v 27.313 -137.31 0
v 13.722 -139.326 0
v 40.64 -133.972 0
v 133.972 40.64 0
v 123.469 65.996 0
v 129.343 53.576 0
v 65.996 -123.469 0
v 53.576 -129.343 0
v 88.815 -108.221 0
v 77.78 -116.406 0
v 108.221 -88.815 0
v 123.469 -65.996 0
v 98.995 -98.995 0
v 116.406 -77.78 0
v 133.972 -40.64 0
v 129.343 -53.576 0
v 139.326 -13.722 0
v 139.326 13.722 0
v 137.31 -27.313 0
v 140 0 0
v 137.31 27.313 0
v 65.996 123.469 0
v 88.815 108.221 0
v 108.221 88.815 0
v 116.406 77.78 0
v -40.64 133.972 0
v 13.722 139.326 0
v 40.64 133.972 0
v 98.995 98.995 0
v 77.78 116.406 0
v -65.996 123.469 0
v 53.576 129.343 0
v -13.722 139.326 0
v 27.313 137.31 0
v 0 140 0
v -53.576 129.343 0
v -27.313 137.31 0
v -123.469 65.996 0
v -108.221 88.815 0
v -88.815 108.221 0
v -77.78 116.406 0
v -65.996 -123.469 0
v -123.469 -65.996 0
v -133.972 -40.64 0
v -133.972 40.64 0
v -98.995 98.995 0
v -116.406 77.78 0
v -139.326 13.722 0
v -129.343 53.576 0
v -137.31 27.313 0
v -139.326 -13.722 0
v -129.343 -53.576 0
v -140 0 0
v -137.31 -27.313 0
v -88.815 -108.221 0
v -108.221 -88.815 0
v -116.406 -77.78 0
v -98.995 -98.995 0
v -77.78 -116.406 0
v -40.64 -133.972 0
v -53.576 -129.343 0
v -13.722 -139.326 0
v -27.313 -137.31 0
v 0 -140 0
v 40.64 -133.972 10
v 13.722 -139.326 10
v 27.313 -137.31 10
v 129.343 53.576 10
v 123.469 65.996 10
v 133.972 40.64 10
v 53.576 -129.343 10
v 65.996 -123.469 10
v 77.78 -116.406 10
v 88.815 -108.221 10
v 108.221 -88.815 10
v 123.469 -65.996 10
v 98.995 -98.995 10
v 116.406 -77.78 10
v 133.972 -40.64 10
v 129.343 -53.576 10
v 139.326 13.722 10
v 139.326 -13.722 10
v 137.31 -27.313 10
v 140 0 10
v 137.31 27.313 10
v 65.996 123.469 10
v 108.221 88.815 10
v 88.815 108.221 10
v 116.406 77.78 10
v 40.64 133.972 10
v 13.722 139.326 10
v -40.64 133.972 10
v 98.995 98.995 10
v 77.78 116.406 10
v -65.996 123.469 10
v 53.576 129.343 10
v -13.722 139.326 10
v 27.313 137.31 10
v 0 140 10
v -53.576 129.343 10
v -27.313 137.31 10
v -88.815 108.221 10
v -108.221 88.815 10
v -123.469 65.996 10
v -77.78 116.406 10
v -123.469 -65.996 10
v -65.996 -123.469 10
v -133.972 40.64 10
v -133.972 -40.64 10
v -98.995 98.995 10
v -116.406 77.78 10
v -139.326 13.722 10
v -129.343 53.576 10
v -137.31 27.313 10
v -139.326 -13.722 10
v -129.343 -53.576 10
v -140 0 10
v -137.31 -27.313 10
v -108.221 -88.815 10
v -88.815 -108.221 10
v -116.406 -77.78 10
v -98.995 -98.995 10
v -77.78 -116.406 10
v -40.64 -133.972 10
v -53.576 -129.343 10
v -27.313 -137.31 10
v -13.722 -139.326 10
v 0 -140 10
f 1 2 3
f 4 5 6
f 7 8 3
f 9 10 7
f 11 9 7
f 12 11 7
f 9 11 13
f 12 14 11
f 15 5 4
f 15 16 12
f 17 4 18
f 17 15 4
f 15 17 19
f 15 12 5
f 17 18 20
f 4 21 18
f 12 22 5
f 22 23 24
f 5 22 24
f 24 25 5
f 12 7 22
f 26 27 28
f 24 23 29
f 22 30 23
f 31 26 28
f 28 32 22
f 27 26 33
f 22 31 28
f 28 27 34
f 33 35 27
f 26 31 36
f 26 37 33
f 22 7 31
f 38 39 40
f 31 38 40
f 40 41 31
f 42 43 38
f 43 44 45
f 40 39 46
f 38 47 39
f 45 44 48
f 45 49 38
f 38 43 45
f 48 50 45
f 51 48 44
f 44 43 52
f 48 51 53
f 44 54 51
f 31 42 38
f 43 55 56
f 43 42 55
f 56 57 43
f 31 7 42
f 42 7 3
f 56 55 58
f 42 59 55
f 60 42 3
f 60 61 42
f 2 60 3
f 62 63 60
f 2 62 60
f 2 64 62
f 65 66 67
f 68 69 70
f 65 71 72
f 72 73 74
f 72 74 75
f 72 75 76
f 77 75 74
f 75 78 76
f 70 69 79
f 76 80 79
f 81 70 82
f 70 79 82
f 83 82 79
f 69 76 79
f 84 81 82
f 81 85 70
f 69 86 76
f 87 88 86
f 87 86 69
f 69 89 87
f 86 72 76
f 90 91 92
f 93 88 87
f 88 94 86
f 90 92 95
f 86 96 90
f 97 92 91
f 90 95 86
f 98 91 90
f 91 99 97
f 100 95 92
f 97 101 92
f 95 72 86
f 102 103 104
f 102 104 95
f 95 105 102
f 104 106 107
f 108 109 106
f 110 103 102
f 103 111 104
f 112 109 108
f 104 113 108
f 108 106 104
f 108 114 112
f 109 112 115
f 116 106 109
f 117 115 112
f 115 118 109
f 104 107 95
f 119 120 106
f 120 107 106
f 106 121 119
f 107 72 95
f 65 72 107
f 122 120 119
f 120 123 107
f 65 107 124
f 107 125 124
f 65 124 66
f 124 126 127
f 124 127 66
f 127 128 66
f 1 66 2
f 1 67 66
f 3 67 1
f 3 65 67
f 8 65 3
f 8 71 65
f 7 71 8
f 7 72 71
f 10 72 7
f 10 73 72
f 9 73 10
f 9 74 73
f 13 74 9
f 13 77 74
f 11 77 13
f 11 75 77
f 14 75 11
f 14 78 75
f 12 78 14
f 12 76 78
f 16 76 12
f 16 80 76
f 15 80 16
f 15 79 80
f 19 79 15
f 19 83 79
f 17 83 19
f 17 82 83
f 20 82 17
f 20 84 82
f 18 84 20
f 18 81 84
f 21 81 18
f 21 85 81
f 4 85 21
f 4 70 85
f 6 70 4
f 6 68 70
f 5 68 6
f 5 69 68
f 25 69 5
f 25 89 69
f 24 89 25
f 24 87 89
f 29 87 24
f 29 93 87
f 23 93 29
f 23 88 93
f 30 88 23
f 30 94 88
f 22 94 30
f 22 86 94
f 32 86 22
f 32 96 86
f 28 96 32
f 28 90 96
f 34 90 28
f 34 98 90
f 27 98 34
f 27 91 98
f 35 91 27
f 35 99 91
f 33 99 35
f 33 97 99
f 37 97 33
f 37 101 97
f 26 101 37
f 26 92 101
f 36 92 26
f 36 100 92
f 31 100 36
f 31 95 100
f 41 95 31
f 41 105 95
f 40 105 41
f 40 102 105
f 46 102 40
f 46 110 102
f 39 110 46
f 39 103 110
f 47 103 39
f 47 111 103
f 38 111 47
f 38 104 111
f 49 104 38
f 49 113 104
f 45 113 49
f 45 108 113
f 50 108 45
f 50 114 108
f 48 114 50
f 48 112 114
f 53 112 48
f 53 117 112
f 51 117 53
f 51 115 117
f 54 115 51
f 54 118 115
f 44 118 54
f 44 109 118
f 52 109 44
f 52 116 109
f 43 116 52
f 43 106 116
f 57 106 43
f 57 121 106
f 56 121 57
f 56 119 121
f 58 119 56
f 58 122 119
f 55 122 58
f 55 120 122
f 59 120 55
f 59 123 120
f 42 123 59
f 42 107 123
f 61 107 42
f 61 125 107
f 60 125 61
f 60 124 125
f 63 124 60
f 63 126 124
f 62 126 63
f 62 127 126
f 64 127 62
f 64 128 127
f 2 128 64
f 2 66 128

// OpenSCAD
linear_extrude(height = 10)
  union() {
    circle(r = 140, $fn = 64);
    circle(r = 30, $fn = 64);
    translate([50, 0]) circle(r = 8, $fn = 64);
    translate([15.451, 47.553]) circle(r = 8, $fn = 64);
    translate([-40.451, 29.389]) circle(r = 8, $fn = 64);
    translate([-40.451, -29.389]) circle(r = 8, $fn = 64);
    translate([15.451, -47.553]) circle(r = 8, $fn = 64);
    translate([85, 0]) circle(r = 5, $fn = 64);
    translate([79.874, 29.072]) circle(r = 5, $fn = 64);
    translate([65.114, 54.637]) circle(r = 5, $fn = 64);
    translate([42.5, 73.612]) circle(r = 5, $fn = 64);
    translate([14.76, 83.709]) circle(r = 5, $fn = 64);
    translate([-14.76, 83.709]) circle(r = 5, $fn = 64);
    translate([-42.5, 73.612]) circle(r = 5, $fn = 64);
    translate([-65.114, 54.637]) circle(r = 5, $fn = 64);
    translate([-79.874, 29.072]) circle(r = 5, $fn = 64);
    translate([-85, 0]) circle(r = 5, $fn = 64);
    translate([-79.874, -29.072]) circle(r = 5, $fn = 64);
    translate([-65.114, -54.637]) circle(r = 5, $fn = 64);
    translate([-42.5, -73.612]) circle(r = 5, $fn = 64);
    translate([-14.76, -83.709]) circle(r = 5, $fn = 64);
    translate([14.76, -83.709]) circle(r = 5, $fn = 64);
    translate([42.5, -73.612]) circle(r = 5, $fn = 64);
    translate([65.114, -54.637]) circle(r = 5, $fn = 64);
    translate([79.874, -29.072]) circle(r = 5, $fn = 64);
    translate([108.329, 19.101]) circle(r = 5, $fn = 64);
    translate([95.263, 55]) circle(r = 5, $fn = 64);
    translate([70.707, 84.265]) circle(r = 5, $fn = 64);
    translate([37.622, 103.366]) circle(r = 5, $fn = 64);
    translate([0, 110]) circle(r = 5, $fn = 64);
    translate([-37.622, 103.366]) circle(r = 5, $fn = 64);
    translate([-70.707, 84.265]) circle(r = 5, $fn = 64);
    translate([-95.263, 55]) circle(r = 5, $fn = 64);
    translate([-108.329, 19.101]) circle(r = 5, $fn = 64);
    translate([-108.329, -19.101]) circle(r = 5, $fn = 64);
    translate([-95.263, -55]) circle(r = 5, $fn = 64);
    translate([-70.707, -84.265]) circle(r = 5, $fn = 64);
    translate([-37.622, -103.366]) circle(r = 5, $fn = 64);
    translate([0, -110]) circle(r = 5, $fn = 64);
    translate([37.622, -103.366]) circle(r = 5, $fn = 64);
    translate([70.707, -84.265]) circle(r = 5, $fn = 64);
    translate([95.263, -55]) circle(r = 5, $fn = 64);
    translate([108.329, -19.101]) circle(r = 5, $fn = 64);
  }
